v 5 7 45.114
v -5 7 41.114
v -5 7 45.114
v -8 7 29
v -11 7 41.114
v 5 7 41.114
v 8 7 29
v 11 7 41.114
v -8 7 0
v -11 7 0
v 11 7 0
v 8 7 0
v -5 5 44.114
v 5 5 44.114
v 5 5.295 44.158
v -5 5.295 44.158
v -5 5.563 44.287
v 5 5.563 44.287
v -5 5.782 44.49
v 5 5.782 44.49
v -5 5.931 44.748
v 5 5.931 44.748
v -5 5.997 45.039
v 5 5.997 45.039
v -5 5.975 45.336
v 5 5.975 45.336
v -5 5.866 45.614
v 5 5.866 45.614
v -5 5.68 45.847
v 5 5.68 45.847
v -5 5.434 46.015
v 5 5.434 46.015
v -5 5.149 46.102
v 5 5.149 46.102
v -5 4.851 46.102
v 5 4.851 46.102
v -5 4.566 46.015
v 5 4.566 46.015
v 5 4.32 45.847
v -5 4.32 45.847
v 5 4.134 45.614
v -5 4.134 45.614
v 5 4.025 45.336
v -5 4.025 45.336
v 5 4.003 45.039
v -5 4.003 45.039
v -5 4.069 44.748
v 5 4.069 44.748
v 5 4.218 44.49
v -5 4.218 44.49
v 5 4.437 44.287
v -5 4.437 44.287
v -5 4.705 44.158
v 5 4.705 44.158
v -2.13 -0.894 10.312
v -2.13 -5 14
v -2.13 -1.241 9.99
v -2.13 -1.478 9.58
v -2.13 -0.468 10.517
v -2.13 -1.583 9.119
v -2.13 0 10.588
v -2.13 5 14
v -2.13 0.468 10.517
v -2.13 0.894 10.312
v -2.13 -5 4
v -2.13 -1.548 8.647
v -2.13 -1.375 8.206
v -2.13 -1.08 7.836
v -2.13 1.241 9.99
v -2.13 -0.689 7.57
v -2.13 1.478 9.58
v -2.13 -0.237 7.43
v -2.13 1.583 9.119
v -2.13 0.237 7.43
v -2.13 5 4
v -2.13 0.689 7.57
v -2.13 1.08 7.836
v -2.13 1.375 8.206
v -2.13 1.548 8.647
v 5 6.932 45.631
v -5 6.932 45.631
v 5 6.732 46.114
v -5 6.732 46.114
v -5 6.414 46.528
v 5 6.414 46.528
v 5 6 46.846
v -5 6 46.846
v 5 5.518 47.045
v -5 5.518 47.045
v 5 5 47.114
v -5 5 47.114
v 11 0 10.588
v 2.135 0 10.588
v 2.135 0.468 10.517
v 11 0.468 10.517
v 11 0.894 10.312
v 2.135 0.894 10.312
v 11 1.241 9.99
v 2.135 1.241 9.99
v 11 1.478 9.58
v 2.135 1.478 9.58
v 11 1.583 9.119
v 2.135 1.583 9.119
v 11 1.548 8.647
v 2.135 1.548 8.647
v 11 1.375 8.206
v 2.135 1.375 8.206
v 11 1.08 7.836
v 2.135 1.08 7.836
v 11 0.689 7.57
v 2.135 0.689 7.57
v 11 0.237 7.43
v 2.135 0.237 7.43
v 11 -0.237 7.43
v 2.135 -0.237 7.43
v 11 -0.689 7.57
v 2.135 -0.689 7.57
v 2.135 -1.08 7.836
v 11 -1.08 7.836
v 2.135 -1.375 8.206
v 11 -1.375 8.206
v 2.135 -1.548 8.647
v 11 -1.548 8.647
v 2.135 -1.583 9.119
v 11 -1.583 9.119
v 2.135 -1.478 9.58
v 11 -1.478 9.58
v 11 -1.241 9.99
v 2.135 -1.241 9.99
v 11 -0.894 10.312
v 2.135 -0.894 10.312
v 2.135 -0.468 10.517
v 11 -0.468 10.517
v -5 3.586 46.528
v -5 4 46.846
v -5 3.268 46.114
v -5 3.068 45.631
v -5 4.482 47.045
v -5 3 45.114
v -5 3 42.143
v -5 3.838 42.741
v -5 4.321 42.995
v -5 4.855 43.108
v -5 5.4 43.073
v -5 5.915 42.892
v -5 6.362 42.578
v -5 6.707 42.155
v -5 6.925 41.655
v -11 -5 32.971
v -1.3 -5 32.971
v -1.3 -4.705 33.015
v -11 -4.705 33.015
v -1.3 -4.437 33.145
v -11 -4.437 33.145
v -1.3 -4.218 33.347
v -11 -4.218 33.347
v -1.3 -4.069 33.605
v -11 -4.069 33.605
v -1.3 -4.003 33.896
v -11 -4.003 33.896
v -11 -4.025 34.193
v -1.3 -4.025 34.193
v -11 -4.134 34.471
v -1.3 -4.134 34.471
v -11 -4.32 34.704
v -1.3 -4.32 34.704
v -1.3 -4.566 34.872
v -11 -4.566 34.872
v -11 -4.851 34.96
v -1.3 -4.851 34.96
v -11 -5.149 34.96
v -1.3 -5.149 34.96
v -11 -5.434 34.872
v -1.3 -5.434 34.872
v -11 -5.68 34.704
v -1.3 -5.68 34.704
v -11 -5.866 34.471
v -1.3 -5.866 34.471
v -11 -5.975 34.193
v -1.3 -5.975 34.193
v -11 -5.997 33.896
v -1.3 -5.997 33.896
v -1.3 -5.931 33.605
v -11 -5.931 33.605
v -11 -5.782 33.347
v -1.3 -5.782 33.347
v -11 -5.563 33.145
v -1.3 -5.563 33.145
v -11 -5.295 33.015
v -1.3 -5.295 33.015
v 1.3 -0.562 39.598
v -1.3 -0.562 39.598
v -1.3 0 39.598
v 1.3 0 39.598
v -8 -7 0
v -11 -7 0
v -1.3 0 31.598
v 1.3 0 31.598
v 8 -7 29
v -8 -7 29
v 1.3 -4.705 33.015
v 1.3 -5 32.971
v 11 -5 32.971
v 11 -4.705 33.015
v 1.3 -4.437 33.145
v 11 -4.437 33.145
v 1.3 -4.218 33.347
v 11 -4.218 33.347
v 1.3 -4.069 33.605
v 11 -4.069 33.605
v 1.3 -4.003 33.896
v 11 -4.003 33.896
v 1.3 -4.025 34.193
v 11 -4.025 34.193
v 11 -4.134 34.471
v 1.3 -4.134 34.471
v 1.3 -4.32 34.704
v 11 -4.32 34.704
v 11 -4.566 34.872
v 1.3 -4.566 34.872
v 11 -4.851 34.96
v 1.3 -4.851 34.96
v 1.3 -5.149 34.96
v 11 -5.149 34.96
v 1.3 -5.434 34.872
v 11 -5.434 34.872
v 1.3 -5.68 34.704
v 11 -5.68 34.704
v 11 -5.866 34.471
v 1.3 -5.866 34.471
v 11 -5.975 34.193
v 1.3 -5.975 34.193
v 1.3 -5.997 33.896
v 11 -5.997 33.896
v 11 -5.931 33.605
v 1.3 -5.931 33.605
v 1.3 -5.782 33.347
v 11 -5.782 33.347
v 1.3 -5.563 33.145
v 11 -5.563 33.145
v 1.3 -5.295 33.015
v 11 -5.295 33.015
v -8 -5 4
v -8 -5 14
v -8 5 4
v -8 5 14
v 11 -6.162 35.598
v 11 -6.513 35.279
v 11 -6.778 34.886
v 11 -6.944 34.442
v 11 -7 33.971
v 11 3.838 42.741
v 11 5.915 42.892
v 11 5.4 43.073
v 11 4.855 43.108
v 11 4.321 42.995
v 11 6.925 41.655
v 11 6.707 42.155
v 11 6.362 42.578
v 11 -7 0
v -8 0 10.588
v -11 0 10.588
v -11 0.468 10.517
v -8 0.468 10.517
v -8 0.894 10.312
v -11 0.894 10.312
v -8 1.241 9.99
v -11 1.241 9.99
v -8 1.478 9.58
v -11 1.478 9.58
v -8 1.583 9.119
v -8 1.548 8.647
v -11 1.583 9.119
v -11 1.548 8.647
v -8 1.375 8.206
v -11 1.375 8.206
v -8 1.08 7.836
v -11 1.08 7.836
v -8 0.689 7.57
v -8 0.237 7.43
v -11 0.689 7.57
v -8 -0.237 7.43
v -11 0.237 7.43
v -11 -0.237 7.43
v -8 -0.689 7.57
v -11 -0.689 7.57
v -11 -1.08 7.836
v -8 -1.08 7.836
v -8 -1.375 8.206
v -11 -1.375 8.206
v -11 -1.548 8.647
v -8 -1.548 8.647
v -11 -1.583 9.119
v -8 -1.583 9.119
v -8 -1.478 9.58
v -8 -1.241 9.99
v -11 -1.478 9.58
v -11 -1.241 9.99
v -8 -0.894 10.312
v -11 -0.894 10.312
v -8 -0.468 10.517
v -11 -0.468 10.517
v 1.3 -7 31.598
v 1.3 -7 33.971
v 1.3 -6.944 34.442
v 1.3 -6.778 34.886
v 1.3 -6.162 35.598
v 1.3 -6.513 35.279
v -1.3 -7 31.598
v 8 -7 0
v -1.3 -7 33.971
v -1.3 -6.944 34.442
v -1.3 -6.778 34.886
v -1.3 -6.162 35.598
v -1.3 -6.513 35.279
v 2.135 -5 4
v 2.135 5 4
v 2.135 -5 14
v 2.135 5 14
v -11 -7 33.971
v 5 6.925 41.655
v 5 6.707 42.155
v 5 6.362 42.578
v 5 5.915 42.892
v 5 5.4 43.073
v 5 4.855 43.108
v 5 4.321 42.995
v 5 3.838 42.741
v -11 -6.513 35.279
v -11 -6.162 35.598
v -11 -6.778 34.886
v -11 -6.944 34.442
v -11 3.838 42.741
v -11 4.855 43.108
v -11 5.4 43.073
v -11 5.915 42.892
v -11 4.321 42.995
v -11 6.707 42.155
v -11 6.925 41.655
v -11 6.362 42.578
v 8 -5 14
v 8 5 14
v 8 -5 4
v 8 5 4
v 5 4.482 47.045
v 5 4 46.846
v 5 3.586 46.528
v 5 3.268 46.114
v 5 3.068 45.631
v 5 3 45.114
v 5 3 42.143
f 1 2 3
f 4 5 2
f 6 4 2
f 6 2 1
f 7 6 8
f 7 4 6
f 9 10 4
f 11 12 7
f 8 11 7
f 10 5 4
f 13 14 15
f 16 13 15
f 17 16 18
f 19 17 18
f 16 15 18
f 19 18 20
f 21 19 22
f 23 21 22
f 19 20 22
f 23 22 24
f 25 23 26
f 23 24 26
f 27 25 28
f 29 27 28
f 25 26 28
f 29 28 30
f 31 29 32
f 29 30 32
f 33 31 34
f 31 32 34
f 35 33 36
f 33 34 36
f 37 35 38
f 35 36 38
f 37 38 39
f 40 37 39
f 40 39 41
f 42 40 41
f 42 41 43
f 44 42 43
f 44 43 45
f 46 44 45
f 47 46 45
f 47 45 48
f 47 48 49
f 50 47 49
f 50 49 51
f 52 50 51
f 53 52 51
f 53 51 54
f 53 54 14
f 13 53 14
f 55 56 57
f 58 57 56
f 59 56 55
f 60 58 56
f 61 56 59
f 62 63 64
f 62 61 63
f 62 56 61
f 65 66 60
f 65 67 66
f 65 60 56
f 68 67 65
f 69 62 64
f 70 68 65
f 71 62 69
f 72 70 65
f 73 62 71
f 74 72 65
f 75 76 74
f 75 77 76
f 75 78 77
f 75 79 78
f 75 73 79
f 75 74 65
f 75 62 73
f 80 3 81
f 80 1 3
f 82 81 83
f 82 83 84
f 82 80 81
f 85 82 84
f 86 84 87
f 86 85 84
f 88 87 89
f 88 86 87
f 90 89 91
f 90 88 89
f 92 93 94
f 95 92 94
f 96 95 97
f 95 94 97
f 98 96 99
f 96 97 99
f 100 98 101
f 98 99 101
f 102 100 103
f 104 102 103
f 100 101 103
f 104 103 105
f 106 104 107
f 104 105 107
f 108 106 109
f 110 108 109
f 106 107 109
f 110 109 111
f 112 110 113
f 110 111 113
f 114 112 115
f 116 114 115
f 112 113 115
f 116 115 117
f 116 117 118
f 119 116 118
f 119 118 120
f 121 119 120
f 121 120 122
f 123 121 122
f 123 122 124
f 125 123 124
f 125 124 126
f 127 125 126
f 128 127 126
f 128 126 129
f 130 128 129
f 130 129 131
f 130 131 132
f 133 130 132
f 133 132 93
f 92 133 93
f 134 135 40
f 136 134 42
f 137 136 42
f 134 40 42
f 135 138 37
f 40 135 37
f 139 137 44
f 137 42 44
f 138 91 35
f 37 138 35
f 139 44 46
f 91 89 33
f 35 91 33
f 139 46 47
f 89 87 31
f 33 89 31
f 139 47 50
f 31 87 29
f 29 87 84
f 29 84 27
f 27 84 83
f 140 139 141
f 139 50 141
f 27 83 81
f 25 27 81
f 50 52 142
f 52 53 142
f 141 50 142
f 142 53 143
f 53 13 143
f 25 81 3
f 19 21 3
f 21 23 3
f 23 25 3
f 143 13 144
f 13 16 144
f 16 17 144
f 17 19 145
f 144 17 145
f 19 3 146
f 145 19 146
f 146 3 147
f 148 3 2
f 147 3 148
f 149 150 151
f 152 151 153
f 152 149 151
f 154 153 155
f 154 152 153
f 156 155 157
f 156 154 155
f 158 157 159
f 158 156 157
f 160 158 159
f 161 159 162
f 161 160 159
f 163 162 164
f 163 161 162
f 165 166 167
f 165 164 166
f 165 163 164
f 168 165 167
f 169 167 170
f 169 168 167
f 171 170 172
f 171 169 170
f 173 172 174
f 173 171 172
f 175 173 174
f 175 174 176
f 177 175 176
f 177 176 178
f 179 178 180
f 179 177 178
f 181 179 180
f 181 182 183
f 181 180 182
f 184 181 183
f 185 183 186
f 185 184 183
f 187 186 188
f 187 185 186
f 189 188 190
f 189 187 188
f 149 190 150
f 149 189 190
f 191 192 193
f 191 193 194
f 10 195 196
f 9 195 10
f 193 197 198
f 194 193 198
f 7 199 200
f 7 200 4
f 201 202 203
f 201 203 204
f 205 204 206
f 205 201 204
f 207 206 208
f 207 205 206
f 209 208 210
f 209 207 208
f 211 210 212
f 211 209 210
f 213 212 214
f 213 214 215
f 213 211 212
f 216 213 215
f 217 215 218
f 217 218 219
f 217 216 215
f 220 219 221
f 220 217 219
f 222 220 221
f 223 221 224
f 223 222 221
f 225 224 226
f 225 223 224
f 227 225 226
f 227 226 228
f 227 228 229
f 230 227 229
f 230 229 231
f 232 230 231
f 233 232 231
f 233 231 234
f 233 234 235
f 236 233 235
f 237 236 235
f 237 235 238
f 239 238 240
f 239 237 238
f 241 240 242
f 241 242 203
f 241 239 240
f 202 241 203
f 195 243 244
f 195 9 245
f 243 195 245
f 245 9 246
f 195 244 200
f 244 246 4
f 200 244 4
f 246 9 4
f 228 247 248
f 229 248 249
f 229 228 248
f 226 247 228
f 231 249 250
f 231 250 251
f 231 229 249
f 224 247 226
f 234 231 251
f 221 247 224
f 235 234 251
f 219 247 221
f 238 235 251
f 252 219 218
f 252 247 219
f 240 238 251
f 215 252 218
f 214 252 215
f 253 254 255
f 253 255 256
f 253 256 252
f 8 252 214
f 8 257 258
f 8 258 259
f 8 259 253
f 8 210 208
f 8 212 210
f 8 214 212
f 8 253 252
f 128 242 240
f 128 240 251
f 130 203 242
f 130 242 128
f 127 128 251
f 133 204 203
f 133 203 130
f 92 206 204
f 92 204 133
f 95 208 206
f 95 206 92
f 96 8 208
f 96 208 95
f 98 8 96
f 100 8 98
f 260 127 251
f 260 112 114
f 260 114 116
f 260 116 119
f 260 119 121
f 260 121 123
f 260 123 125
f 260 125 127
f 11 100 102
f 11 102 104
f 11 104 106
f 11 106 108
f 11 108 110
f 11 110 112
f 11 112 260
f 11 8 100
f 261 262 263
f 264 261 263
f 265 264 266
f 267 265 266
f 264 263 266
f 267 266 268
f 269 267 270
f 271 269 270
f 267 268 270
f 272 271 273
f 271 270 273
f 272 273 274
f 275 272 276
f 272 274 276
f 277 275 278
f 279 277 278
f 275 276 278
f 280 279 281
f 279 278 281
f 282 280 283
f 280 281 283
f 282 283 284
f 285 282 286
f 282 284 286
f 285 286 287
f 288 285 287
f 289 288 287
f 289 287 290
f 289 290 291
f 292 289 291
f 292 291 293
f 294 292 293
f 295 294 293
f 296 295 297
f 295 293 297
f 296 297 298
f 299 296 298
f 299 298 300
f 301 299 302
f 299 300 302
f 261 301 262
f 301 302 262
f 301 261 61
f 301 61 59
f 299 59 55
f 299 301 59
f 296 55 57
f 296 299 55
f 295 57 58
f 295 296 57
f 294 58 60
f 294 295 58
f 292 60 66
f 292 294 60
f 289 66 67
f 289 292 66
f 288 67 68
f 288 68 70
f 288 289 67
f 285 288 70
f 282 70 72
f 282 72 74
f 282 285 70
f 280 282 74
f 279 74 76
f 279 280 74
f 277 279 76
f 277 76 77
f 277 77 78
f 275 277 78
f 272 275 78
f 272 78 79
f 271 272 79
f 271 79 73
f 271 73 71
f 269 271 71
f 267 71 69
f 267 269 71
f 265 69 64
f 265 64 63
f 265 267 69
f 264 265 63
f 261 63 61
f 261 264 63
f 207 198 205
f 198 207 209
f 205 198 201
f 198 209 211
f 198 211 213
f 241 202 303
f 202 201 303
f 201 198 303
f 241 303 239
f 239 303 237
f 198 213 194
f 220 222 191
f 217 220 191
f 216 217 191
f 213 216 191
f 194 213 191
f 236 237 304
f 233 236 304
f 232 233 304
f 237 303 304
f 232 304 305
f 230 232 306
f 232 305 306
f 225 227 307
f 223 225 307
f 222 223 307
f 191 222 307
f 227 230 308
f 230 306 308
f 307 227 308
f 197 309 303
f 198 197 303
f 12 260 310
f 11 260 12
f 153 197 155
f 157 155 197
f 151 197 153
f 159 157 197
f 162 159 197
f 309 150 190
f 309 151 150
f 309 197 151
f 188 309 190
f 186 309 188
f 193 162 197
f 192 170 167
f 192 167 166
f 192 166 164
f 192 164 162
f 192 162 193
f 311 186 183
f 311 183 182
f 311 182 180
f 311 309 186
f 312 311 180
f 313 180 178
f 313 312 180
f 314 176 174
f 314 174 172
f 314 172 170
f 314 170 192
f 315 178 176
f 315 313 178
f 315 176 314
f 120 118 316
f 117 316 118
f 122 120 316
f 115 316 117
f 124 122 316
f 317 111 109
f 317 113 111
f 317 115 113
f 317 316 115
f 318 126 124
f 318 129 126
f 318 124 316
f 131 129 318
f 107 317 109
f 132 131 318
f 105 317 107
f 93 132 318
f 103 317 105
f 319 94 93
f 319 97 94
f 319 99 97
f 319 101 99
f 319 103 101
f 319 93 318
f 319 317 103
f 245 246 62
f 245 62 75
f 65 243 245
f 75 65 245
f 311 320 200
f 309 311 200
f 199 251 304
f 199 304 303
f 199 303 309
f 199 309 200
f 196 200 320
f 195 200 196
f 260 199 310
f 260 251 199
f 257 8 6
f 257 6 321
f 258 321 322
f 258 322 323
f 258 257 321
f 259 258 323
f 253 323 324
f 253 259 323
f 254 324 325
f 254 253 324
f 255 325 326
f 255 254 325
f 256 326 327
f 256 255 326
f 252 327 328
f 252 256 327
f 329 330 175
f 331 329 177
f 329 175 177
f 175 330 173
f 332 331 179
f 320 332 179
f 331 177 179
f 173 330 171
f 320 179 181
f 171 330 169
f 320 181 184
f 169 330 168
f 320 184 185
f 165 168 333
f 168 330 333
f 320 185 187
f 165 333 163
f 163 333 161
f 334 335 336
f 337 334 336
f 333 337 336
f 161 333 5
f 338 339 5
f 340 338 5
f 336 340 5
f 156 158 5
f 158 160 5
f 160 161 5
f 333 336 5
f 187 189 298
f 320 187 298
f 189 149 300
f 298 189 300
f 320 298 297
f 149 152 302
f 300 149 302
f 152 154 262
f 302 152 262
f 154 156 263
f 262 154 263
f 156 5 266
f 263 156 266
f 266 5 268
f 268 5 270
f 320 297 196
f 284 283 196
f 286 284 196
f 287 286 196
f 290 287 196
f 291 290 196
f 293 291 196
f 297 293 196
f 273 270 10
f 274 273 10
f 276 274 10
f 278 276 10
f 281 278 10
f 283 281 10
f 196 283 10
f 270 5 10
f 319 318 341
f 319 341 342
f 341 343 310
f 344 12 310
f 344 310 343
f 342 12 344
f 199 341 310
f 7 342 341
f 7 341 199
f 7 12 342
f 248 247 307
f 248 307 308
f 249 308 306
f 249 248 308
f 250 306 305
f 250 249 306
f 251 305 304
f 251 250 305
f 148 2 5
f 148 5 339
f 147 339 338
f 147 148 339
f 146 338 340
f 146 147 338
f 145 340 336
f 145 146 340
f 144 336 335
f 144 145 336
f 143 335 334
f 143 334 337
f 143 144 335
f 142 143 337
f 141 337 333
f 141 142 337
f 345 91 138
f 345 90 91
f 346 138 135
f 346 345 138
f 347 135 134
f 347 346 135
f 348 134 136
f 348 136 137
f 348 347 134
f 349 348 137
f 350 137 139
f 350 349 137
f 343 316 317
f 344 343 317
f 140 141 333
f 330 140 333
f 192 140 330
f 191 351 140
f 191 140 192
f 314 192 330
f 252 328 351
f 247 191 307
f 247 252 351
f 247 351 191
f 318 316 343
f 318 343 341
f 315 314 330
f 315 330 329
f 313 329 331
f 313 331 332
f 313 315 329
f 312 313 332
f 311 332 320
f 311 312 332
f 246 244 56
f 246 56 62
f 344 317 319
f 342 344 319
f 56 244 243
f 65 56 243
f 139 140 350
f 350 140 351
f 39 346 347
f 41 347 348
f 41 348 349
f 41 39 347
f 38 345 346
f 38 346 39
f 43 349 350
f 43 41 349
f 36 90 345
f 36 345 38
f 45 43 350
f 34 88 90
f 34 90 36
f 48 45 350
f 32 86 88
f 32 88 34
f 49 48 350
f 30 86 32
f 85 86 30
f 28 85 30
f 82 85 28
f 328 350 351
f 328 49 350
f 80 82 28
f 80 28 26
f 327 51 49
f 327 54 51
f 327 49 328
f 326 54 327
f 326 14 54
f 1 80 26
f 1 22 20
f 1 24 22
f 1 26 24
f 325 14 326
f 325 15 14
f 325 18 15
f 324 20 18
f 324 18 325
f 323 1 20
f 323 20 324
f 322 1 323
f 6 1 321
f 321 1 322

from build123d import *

# Parameters (mm, degrees)
SKETCH1_R              = 1
BOSS_EXTRUDE1_DEPTH    = 11
SKETCH2_W              = 10
SKETCH2_H              = 6
BOSS_EXTRUDE2_DEPTH    = 4
CUT_EXTRUDE1_REACH     = 52.246
SKETCH3_R              = 1
FILLET1_R              = 2
SKETCH4_W              = 2.6
SKETCH4_H              = 8
CUT_EXTRUDE3_DEPTH     = 7
CUT_EXTRUDE4_START     = -8
CUT_EXTRUDE4_OUTLINE_W = 29
CUT_EXTRUDE4_OUTLINE_H = 14
CUT_EXTRUDE4_DEPTH     = 16
SKETCH5_3_R            = 1.5875
CUT_EXTRUDE5_DEPTH     = 12.5
SKETCH7_W              = 10
SKETCH7_H              = 10
SKETCH7_R              = 1.5875
BOSS_EXTRUDE3_DEPTH    = 5.87
BOSS_EXTRUDE4_START    = 5.865
SKETCH9_W              = 10
SKETCH9_H              = 10
SKETCH9_R              = 1.5875
BOSS_EXTRUDE4_DEPTH    = 5.865


# Read off the part's stored shape, not the designer's step: Cut-Extrude4
with BuildPart() as part:
    # Sketch1 → Boss-Extrude1 (new, symmetric)
    with BuildSketch(Plane(origin=(0, 0, 0), x_dir=(0, 0, -1), z_dir=(1, 0, 0))):
        with BuildLine():
            Line((-42.741088295, 3.837523613), (-35.598231152, -6.162476387))
            ThreePointArc((-35.598231152, -6.162476387), (-34.885927371, -6.778335285), (-33.970764209, -7))
            Line((-33.970764209, -7), (0, -7))
            Line((0, -7), (0, 7))
            Line((0, 7), (-41.113621352, 7))
            ThreePointArc((-41.113621352, 7), (-42.891956638, 5.915163162), (-42.741088295, 3.837523613))
        make_face()
        with Locations((-33.970764209, -5)):
            Circle(SKETCH1_R, mode=Mode.SUBTRACT)
    extrude(amount=BOSS_EXTRUDE1_DEPTH, both=True)

    # Sketch2 → Boss-Extrude2 (add)
    with BuildSketch(Plane(origin=(0, 7, 0), x_dir=(1, 0, 0), z_dir=(0, 1, 0))):
        with Locations((0, -44.113621352)):
            Rectangle(SKETCH2_W, SKETCH2_H)
    extrude(amount=-BOSS_EXTRUDE2_DEPTH)

    # Sketch3 → Cut-Extrude1 (cut, up to next)
    with BuildSketch(Plane(origin=(5, 0, 0), x_dir=(0, 0, -1), z_dir=(1, 0, 0)), mode=Mode.PRIVATE) as cut_extrude1_sk1:
        with Locations((-45.113621352, 5)):
            Circle(SKETCH3_R)
    cut_extrude1_tool1 = extrude(cut_extrude1_sk1.sketch, amount=-CUT_EXTRUDE1_REACH, mode=Mode.PRIVATE) & part.part
    add(cut_extrude1_tool1.solids().sort_by_distance((5, 5, 45.113621))[0], mode=Mode.SUBTRACT)

    # Fillet1
    fillet1_edges = [part.edges().sort_by_distance(p)[0] for p in [
        (0, 3, 47.113621352),
        (0, 7, 47.113621352),
    ]]
    fillet(fillet1_edges, radius=FILLET1_R - 0.0001)  # a hair under: the kernel refuses the full size

    # Sketch4 → Cut-Extrude3 (cut)
    with BuildSketch(Plane.XZ.offset(7)):
        with Locations((0, 35.598231152)):
            Rectangle(SKETCH4_W, SKETCH4_H)
    extrude(amount=-CUT_EXTRUDE3_DEPTH, mode=Mode.SUBTRACT)

    # Cut-Extrude4 outline → Cut-Extrude4 (cut)
    with BuildSketch(Plane.ZY.offset(CUT_EXTRUDE4_START)):
        with Locations((14.5, 0)):
            Rectangle(CUT_EXTRUDE4_OUTLINE_W, CUT_EXTRUDE4_OUTLINE_H)
    extrude(amount=CUT_EXTRUDE4_DEPTH, mode=Mode.SUBTRACT)

    # Sketch5<3> → Cut-Extrude5 (cut, symmetric)
    with BuildSketch(Plane.ZY):
        with Locations((9, 0)):
            Circle(SKETCH5_3_R)
    extrude(amount=CUT_EXTRUDE5_DEPTH, both=True, mode=Mode.SUBTRACT)

    # Sketch7 → Boss-Extrude3 (add)
    with BuildSketch(Plane(origin=(-8, 0, 0), x_dir=(0, 0, -1), z_dir=(1, 0, 0))):
        with Locations((-9, 0)):
            Rectangle(SKETCH7_W, SKETCH7_H)
        with Locations(Location((-9, 0, 0), (0, 0, 180))):
            Circle(SKETCH7_R, mode=Mode.SUBTRACT)
    extrude(amount=BOSS_EXTRUDE3_DEPTH)

    # Sketch9 → Boss-Extrude4 (add)
    with BuildSketch(Plane.ZY.offset(-8).offset(BOSS_EXTRUDE4_START)):
        with Locations((9, 0)):
            Rectangle(SKETCH9_W, SKETCH9_H)
        with Locations((9, 0)):
            Circle(SKETCH9_R, mode=Mode.SUBTRACT)
    extrude(amount=-BOSS_EXTRUDE4_DEPTH)


solid = part.part
